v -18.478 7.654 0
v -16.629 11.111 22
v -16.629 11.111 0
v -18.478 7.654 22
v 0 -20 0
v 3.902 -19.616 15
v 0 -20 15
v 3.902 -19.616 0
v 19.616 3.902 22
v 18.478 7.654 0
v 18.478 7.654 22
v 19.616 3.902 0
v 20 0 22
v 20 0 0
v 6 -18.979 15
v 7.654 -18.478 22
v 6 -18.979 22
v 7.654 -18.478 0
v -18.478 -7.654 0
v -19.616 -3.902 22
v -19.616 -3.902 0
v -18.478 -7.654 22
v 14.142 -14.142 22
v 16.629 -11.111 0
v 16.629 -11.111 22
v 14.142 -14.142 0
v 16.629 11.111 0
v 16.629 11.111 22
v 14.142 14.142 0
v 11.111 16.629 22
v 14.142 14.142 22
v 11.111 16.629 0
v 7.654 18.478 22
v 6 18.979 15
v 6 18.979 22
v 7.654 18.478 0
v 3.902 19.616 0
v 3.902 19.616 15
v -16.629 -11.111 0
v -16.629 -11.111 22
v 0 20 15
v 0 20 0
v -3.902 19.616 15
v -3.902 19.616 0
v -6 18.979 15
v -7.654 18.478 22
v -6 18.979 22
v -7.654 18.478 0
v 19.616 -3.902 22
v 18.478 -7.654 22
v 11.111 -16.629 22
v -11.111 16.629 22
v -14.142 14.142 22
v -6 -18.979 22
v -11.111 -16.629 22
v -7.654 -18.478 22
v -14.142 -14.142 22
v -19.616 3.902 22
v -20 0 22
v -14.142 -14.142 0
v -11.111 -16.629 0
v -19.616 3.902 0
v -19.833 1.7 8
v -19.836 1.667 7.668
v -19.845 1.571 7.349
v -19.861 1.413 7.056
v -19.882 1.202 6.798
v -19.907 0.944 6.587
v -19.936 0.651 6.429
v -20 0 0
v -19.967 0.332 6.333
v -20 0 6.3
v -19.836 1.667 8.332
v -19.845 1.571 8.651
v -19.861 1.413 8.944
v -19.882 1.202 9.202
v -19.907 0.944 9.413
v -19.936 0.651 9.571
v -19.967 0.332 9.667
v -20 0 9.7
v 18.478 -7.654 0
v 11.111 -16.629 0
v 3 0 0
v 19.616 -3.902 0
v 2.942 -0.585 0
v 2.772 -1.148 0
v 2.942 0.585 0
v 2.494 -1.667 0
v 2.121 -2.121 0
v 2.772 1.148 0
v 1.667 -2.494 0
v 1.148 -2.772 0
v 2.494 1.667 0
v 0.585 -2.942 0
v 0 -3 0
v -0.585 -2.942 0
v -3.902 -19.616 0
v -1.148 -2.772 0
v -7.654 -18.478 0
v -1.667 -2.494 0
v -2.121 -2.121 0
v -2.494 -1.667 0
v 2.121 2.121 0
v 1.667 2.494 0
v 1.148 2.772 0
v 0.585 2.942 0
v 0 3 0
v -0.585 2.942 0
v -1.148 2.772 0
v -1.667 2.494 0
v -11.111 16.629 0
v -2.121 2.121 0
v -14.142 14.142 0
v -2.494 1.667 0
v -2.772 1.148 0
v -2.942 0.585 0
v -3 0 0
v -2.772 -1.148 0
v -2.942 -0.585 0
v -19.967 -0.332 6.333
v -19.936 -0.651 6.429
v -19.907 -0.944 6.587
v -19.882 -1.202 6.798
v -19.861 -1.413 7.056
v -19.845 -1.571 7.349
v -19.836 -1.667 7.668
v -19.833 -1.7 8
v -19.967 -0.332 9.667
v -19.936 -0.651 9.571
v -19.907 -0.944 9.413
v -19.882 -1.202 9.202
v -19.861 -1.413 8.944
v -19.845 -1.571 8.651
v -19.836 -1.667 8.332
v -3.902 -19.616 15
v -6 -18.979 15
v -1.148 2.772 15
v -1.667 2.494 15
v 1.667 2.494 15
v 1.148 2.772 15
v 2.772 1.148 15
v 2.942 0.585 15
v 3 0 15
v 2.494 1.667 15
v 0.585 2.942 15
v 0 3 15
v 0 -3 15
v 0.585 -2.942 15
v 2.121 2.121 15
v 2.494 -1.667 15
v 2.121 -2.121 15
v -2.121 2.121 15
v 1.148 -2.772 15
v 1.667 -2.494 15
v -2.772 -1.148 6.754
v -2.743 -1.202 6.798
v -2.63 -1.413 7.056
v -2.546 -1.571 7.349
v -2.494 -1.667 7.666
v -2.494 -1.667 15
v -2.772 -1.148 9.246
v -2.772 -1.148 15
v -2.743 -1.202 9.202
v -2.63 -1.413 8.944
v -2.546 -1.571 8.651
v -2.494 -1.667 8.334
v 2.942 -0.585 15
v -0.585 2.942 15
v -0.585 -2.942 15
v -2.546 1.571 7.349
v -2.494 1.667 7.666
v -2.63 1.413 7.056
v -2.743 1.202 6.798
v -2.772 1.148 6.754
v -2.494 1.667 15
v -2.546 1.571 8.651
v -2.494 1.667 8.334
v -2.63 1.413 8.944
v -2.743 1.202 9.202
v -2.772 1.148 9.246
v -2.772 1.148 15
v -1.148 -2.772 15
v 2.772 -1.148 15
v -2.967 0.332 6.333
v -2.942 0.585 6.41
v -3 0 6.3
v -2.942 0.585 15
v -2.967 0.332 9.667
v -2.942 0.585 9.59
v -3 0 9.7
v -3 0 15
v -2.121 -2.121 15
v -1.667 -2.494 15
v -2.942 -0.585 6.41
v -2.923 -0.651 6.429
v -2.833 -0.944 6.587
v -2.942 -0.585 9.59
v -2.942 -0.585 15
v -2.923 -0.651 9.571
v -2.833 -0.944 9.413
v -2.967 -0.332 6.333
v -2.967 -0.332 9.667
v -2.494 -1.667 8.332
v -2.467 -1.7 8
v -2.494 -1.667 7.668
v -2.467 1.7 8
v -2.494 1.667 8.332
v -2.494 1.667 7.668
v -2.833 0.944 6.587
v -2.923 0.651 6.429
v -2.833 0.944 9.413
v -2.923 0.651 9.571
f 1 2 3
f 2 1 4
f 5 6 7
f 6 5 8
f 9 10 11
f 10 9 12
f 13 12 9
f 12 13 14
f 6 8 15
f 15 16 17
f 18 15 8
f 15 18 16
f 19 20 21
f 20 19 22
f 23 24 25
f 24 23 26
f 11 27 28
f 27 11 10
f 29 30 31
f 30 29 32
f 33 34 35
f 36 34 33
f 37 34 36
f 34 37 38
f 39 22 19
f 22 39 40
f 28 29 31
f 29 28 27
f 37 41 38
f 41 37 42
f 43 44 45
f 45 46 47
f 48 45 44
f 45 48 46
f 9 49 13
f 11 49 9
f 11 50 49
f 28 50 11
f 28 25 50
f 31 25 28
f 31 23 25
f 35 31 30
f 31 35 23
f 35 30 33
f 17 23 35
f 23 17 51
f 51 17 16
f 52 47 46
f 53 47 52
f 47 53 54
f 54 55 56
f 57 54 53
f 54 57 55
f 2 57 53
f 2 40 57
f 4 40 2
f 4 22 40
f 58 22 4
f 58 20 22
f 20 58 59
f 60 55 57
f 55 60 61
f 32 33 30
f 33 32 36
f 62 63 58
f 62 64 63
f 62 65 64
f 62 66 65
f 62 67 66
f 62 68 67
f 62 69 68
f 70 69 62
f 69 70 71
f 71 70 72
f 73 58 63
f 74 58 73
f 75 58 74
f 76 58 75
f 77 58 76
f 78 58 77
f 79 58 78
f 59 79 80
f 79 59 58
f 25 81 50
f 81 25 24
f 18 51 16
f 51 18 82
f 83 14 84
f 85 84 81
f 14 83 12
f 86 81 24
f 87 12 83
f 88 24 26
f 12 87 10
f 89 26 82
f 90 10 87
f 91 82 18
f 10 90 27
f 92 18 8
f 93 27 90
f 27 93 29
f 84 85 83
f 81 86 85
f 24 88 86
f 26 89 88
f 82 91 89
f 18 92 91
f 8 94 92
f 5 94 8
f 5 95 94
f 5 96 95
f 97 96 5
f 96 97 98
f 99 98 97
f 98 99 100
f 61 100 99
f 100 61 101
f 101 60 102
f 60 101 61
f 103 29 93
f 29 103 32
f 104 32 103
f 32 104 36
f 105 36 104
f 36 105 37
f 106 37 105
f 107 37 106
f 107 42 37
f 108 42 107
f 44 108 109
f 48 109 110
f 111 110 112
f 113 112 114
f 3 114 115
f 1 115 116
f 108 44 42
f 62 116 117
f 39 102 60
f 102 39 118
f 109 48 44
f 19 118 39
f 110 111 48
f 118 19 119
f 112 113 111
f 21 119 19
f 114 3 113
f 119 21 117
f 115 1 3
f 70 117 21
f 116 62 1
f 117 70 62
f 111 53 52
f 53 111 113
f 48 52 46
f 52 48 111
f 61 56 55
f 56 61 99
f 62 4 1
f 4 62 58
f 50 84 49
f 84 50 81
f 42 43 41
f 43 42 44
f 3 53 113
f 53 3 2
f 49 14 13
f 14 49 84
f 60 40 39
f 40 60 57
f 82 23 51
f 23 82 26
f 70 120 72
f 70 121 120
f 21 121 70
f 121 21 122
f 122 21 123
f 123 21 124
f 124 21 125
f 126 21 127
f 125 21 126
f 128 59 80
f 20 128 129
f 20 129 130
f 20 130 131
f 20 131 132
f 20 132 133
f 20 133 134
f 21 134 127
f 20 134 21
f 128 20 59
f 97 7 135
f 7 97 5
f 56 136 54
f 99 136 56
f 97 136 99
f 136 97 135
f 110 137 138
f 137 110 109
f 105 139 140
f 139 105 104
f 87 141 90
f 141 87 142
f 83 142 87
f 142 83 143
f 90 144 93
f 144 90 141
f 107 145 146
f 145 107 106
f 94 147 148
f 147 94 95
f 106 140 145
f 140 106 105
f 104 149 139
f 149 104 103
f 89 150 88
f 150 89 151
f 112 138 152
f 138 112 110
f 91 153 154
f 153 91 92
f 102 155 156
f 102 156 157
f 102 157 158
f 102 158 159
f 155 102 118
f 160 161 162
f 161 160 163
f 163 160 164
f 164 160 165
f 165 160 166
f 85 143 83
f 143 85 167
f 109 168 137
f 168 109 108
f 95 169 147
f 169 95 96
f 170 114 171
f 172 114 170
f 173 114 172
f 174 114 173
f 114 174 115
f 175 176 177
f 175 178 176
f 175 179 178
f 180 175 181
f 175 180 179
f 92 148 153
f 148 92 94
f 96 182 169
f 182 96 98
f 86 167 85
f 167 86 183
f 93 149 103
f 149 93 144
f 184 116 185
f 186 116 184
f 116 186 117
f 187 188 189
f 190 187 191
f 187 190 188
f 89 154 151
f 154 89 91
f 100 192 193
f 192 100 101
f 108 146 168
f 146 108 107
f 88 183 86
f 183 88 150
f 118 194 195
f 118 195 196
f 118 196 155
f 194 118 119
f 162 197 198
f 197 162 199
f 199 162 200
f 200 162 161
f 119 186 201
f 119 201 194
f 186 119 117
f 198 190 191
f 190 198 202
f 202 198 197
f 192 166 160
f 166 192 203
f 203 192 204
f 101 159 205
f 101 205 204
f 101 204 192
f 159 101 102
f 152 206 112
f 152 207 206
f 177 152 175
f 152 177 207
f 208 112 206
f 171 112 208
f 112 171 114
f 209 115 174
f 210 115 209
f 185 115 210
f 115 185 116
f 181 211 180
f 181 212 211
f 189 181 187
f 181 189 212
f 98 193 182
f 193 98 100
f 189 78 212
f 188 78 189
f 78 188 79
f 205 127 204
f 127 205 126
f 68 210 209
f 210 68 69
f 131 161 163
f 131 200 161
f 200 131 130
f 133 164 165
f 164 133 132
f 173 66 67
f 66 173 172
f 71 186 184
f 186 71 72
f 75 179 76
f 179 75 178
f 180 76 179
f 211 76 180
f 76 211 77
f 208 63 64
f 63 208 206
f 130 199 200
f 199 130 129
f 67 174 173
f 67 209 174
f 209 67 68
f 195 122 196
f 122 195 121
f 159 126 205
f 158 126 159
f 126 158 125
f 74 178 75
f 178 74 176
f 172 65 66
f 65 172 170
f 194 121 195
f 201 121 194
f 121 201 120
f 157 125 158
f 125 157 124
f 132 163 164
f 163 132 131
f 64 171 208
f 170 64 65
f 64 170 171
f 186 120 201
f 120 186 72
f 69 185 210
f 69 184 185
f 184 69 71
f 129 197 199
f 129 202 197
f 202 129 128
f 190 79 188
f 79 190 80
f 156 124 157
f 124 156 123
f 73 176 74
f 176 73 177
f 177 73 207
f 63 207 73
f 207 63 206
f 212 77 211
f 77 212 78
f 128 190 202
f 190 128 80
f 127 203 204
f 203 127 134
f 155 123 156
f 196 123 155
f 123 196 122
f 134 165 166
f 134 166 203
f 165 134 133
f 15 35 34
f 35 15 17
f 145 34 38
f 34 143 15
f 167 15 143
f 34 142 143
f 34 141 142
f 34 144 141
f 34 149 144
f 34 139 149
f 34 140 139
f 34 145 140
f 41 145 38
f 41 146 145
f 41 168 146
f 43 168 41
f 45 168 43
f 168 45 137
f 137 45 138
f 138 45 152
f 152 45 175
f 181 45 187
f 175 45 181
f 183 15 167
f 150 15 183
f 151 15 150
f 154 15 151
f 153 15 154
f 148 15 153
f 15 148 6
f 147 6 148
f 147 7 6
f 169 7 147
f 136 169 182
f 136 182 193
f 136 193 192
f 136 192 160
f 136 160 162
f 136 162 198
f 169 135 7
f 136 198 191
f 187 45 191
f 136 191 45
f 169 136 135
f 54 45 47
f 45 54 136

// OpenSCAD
$fn = 32;

// ----------------------------------------------------------------------
// Oldham coupling hub: 40 x 22 mm
// ----------------------------------------------------------------------

// --- parameters (mm) ---
body_d = 40;              // hub diameter
body_l = 16;              // hub length
shaft_d = 6;              // shaft bore
cam_w = 12;               // drive tongue width
tongue_h = 6;             // drive tongue height
set_d = 3.4;              // set screw tap hole

module hub() {
  /* the slot side is a raised disc with a groove milled across it */
  cylinder(h = body_l + tongue_h, d = body_d);
}

difference() {
  hub();
  translate([0, 0, -1]) cylinder(h = body_l + tongue_h + 2, d = shaft_d);
  translate([-body_d / 2 - 1, 0, body_l * 0.5])
    rotate([0, 90, 0]) cylinder(h = body_d / 2 + 2, d = set_d);
  translate([-cam_w / 2, -body_d / 2 - 1, body_l - 1])
    cube([cam_w, body_d + 2, tongue_h + 1]);
}
